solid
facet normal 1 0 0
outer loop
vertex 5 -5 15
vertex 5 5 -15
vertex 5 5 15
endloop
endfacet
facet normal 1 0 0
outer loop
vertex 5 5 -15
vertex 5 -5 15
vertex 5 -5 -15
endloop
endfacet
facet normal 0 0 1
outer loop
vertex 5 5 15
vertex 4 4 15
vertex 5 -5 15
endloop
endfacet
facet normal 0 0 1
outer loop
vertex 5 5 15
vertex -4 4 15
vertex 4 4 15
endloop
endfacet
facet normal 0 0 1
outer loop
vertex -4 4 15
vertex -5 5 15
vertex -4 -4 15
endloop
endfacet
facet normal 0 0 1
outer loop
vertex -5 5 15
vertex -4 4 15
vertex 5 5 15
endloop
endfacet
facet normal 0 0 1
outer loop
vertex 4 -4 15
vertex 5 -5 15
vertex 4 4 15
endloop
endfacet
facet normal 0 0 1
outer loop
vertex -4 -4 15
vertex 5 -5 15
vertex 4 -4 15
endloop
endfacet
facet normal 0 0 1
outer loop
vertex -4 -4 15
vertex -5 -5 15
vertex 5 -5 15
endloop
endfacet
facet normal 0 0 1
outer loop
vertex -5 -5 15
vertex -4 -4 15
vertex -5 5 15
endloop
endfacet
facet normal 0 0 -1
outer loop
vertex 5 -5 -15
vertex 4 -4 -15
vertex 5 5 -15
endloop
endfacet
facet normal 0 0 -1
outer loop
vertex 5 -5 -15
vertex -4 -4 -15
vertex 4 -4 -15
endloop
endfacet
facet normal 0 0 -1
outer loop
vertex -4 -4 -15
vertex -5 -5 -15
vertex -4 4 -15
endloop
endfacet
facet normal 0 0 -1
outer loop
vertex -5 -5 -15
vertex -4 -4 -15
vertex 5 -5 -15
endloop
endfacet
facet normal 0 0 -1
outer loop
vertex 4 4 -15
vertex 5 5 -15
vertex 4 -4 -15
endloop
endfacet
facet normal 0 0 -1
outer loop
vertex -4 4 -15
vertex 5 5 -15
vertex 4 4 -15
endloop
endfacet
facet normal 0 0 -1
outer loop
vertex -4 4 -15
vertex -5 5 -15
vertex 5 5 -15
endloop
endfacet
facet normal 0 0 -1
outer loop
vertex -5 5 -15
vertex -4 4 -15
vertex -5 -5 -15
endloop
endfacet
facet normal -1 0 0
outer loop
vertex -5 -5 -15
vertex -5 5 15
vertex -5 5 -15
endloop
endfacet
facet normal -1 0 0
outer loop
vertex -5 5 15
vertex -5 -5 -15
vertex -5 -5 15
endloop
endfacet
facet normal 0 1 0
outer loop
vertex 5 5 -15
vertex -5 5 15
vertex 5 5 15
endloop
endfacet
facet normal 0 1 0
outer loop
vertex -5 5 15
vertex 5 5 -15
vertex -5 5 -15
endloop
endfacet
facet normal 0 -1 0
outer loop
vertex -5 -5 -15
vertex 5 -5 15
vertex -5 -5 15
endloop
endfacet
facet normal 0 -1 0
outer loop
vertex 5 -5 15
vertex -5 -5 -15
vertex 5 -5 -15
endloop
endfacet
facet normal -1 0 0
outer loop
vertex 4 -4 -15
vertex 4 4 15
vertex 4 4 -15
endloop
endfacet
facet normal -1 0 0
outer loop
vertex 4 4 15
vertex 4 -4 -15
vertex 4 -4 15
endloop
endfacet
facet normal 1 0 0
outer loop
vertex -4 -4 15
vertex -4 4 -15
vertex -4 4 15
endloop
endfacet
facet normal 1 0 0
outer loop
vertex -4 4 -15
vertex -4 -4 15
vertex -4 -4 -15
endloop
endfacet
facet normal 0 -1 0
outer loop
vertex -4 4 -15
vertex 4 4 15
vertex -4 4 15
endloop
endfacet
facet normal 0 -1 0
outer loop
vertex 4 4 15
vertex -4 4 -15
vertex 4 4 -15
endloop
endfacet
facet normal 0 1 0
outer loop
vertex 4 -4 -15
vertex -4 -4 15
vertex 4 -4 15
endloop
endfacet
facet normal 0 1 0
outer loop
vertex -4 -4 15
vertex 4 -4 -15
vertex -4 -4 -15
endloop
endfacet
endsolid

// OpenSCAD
// variables
length = 10; // [10:400]
width = 10; // [10:400]
height = 30; // [1:400]
wallthickness = 1; // [1:30]
// model
difference(){
cube(size=[length,width,height],center=true);
cube(size=[length-2*wallthickness,width-2*wallthickness,height],center=true);
}
